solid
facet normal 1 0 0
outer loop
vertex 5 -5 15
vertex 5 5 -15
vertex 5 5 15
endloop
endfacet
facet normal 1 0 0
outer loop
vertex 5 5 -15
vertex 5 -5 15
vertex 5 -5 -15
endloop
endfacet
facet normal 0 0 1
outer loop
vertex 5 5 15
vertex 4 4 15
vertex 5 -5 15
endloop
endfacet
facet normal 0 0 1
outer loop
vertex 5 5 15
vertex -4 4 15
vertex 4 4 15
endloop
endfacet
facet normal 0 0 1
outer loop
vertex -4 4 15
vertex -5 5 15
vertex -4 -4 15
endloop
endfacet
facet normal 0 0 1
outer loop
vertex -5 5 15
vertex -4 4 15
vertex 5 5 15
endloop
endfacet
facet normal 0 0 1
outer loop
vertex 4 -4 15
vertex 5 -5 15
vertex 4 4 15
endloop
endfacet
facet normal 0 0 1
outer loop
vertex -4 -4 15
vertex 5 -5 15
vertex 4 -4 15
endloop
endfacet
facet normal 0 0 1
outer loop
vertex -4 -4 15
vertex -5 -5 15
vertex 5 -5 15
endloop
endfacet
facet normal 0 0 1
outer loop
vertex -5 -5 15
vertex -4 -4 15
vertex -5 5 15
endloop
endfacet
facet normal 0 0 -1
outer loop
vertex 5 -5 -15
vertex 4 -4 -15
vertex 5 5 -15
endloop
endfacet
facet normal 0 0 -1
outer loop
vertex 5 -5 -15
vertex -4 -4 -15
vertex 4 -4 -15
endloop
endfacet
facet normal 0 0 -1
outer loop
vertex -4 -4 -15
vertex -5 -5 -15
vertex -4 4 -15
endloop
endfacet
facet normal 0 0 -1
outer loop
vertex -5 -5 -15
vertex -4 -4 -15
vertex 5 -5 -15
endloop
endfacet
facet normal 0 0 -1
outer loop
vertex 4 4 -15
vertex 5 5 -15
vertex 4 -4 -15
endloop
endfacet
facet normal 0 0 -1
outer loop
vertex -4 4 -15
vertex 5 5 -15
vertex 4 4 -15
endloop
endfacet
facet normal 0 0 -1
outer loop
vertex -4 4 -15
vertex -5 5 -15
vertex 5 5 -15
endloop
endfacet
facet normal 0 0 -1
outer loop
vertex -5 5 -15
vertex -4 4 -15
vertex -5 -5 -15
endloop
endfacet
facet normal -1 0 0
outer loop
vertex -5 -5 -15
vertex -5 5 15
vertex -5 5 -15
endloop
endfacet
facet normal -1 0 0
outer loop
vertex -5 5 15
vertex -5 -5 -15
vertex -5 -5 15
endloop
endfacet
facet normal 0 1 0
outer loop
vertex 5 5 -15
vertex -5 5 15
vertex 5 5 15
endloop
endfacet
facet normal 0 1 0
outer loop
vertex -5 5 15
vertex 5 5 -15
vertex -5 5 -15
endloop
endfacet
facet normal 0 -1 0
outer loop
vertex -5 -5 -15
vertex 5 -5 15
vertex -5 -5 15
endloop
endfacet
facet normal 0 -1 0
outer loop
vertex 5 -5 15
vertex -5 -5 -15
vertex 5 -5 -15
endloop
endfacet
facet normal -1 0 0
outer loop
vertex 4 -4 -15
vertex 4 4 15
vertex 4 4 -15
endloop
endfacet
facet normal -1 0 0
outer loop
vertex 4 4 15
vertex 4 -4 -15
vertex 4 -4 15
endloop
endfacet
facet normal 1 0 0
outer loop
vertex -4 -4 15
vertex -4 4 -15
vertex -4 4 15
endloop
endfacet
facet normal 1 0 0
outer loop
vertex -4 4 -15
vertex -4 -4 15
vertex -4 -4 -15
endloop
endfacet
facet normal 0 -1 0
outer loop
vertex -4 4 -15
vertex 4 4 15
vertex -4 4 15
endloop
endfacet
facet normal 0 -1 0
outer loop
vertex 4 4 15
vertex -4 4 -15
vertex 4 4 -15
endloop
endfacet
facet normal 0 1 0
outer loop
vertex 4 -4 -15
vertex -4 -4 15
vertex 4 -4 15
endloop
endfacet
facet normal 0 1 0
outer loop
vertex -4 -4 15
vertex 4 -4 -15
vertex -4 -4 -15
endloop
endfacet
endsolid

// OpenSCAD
// variables
length = 10; // [10:400]
width = 10; // [10:400]
height = 30; // [1:400]
wallthickness = 1; // [1:30]
// model
difference(){
cube(size=[length,width,height],center=true);
cube(size=[length-2*wallthickness,width-2*wallthickness,height],center=true);
}
